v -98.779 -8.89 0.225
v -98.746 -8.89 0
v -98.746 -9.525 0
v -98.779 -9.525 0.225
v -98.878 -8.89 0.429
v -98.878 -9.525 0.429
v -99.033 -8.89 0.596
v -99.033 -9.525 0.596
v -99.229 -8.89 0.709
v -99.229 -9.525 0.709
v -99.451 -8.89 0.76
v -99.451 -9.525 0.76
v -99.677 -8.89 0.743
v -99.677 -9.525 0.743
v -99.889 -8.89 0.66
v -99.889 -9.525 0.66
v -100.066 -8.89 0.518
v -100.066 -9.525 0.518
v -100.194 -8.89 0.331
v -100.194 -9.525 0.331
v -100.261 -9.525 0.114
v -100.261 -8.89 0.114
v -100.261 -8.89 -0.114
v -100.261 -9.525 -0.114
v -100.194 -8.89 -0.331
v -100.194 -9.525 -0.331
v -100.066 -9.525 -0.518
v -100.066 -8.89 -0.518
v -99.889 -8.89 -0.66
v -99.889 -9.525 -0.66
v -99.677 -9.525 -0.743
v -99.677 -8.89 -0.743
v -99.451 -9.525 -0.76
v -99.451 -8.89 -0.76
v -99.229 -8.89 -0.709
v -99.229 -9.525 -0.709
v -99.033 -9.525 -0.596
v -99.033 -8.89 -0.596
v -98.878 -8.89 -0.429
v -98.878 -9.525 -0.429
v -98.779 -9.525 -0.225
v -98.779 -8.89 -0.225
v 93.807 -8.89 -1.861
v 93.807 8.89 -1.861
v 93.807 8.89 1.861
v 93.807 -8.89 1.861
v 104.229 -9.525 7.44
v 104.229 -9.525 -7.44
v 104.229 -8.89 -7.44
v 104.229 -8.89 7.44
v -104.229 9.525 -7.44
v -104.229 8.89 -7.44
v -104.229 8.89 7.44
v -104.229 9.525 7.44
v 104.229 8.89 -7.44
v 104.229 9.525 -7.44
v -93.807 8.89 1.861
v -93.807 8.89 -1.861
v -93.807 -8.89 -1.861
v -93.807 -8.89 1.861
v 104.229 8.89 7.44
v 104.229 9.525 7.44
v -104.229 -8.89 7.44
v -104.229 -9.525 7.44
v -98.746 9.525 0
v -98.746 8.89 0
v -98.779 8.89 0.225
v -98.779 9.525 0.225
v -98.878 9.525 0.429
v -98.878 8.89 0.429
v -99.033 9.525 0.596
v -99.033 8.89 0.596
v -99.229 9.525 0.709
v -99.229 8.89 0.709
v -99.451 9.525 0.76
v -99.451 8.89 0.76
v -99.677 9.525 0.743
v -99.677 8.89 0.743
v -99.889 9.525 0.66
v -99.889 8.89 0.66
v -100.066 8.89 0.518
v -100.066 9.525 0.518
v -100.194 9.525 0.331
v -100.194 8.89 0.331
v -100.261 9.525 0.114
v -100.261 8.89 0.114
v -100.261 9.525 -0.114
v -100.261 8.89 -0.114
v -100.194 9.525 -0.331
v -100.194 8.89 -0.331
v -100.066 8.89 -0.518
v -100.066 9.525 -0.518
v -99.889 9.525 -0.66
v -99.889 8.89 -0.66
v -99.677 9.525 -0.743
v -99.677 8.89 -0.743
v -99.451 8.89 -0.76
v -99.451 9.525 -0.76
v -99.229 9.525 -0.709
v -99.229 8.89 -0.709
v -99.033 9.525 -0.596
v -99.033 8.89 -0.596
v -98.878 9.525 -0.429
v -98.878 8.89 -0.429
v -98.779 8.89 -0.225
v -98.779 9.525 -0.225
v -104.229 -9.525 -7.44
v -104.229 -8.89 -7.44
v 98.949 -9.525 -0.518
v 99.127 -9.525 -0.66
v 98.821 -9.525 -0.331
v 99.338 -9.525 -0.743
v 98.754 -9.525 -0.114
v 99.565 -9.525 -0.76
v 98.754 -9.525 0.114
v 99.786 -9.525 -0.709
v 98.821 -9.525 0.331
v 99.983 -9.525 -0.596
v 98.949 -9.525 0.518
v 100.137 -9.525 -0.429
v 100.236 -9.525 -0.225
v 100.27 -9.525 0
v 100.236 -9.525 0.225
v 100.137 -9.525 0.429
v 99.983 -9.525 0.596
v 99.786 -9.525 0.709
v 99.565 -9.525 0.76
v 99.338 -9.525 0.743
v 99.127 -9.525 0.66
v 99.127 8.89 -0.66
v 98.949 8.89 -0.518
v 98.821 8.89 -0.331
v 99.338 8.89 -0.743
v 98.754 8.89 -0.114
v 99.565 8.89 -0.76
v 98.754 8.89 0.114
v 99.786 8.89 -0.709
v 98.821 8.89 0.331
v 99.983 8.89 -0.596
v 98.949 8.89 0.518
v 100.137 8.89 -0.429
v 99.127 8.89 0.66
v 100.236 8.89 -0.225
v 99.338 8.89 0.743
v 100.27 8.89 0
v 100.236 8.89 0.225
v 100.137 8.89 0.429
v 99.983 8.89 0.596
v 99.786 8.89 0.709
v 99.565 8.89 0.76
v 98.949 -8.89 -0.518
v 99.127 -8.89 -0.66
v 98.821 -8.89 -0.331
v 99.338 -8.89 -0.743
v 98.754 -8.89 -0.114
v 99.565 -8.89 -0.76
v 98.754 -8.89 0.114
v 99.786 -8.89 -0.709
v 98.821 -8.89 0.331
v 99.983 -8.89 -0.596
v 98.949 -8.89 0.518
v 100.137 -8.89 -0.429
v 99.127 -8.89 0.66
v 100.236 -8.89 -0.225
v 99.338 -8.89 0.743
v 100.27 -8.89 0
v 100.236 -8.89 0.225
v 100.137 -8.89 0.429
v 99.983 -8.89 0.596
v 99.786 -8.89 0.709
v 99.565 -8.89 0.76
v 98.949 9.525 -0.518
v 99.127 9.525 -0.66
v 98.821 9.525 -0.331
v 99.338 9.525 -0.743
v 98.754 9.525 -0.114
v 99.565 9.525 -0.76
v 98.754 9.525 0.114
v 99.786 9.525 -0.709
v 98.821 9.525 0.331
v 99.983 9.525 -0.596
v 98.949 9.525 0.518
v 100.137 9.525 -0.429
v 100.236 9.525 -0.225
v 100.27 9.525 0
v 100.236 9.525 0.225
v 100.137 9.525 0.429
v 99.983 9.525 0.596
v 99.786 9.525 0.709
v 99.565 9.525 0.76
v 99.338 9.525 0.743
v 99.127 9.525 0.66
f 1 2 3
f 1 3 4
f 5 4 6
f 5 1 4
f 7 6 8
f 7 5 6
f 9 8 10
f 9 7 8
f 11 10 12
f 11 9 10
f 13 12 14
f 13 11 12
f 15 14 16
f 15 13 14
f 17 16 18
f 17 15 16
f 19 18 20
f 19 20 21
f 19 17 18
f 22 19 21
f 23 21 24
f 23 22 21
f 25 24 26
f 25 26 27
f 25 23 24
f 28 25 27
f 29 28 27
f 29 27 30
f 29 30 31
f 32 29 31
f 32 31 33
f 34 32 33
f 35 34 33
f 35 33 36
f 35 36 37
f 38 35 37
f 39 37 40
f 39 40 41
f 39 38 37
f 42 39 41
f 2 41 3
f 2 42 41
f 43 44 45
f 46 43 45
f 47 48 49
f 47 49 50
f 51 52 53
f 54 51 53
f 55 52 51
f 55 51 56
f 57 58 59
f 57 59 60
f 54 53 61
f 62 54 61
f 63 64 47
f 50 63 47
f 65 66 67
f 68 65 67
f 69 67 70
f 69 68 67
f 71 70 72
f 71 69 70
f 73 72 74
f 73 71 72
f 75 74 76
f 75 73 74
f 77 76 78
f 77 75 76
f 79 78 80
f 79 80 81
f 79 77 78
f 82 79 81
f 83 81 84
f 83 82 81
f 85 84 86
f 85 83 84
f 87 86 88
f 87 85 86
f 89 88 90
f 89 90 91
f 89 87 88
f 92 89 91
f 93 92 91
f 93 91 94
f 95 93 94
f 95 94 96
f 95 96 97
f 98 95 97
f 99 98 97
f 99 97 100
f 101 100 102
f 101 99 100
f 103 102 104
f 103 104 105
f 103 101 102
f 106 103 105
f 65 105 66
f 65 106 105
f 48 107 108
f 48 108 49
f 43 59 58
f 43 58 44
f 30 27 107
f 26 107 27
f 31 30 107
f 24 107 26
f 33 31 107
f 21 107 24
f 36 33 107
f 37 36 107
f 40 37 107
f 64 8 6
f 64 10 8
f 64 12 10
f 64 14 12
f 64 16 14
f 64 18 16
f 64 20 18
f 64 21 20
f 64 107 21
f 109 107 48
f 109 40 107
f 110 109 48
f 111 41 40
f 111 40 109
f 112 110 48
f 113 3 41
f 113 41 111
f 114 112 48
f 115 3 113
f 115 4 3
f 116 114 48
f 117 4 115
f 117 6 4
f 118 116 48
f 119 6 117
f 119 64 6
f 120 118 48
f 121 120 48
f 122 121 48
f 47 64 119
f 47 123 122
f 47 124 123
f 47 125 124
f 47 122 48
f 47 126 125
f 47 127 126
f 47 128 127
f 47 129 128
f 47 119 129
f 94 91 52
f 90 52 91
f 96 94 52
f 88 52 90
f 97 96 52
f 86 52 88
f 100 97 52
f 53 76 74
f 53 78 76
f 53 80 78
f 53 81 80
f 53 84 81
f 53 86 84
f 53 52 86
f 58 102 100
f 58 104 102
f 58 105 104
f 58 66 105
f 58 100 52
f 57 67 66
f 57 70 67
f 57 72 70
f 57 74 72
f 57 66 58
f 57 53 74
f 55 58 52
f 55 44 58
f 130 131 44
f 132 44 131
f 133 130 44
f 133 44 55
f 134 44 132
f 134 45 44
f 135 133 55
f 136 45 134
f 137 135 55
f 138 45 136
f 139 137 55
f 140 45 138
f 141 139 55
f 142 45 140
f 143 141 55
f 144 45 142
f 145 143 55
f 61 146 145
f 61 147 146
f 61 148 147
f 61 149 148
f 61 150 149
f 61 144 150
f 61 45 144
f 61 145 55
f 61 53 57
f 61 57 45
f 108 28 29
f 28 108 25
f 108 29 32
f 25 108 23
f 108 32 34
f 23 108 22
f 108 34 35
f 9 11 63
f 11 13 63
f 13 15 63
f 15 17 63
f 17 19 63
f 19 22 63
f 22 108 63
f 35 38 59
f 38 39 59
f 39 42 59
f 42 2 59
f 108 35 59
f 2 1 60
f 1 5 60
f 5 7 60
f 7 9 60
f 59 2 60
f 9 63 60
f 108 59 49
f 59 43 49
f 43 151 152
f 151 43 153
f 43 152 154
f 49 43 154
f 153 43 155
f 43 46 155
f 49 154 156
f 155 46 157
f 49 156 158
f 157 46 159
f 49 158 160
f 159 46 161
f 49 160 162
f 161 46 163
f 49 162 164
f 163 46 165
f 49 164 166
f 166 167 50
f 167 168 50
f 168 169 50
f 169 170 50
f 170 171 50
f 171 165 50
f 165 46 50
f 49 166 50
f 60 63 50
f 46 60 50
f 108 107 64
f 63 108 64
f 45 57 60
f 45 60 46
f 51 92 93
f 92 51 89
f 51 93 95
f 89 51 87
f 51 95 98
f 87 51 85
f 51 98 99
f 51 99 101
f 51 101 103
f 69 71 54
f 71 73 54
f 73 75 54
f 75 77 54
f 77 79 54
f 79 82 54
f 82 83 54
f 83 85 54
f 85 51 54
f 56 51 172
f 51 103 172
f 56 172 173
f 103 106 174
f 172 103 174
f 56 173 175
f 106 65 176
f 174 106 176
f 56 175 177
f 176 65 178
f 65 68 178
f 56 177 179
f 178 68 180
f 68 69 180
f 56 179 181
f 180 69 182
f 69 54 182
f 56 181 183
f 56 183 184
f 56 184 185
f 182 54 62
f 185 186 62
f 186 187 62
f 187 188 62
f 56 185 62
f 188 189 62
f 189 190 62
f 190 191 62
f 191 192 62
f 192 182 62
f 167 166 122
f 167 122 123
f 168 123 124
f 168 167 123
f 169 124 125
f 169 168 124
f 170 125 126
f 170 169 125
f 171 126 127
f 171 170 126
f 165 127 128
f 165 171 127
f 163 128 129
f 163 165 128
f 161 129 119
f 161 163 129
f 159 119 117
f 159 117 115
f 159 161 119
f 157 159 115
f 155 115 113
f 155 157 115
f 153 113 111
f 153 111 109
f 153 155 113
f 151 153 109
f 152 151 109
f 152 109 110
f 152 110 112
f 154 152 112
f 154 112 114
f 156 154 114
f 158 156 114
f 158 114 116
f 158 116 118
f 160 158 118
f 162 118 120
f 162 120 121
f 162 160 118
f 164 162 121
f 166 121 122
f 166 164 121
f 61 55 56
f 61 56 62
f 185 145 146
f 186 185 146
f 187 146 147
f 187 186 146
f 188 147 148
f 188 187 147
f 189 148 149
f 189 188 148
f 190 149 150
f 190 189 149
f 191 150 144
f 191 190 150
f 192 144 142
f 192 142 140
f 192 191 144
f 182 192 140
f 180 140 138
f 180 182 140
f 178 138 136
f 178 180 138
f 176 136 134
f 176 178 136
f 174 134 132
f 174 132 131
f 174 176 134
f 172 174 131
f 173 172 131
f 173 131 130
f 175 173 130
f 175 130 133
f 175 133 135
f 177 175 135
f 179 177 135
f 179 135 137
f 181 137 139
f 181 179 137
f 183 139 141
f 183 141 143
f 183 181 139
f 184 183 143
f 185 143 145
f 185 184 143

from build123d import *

# Parameters (mm, degrees)
F0_W     = 208.457162
F0_H     = 14.880452
F0_R     = 0.762
F0_W_2   = 187.614396
F0_H_2   = 3.722524
F1_DEPTH = 9.525
F2_DEPTH = 8.89


with BuildPart() as f1:
    # F0 (on Front) → F1 (new body, symmetric)
    with BuildSketch(Plane.XZ):
        Rectangle(F0_W, F0_H)
        with Locations((-99.507612, 0)):
            Circle(F0_R, mode=Mode.SUBTRACT)
        Rectangle(F0_W_2, F0_H_2, mode=Mode.SUBTRACT)
        with Locations((99.507612, 0)):
            Circle(F0_R, mode=Mode.SUBTRACT)
        Rectangle(F0_W_2, F0_H_2)
    extrude(amount=F1_DEPTH, both=True)

    # F0 (on Front) → F2 (cut, symmetric)
    with BuildSketch(Plane.XZ):
        Rectangle(F0_W, F0_H)
        with Locations((-99.507612, 0)):
            Circle(F0_R, mode=Mode.SUBTRACT)
        Rectangle(F0_W_2, F0_H_2, mode=Mode.SUBTRACT)
        with Locations((99.507612, 0)):
            Circle(F0_R, mode=Mode.SUBTRACT)
    extrude(amount=F2_DEPTH, both=True, mode=Mode.SUBTRACT)


solid = f1.part
